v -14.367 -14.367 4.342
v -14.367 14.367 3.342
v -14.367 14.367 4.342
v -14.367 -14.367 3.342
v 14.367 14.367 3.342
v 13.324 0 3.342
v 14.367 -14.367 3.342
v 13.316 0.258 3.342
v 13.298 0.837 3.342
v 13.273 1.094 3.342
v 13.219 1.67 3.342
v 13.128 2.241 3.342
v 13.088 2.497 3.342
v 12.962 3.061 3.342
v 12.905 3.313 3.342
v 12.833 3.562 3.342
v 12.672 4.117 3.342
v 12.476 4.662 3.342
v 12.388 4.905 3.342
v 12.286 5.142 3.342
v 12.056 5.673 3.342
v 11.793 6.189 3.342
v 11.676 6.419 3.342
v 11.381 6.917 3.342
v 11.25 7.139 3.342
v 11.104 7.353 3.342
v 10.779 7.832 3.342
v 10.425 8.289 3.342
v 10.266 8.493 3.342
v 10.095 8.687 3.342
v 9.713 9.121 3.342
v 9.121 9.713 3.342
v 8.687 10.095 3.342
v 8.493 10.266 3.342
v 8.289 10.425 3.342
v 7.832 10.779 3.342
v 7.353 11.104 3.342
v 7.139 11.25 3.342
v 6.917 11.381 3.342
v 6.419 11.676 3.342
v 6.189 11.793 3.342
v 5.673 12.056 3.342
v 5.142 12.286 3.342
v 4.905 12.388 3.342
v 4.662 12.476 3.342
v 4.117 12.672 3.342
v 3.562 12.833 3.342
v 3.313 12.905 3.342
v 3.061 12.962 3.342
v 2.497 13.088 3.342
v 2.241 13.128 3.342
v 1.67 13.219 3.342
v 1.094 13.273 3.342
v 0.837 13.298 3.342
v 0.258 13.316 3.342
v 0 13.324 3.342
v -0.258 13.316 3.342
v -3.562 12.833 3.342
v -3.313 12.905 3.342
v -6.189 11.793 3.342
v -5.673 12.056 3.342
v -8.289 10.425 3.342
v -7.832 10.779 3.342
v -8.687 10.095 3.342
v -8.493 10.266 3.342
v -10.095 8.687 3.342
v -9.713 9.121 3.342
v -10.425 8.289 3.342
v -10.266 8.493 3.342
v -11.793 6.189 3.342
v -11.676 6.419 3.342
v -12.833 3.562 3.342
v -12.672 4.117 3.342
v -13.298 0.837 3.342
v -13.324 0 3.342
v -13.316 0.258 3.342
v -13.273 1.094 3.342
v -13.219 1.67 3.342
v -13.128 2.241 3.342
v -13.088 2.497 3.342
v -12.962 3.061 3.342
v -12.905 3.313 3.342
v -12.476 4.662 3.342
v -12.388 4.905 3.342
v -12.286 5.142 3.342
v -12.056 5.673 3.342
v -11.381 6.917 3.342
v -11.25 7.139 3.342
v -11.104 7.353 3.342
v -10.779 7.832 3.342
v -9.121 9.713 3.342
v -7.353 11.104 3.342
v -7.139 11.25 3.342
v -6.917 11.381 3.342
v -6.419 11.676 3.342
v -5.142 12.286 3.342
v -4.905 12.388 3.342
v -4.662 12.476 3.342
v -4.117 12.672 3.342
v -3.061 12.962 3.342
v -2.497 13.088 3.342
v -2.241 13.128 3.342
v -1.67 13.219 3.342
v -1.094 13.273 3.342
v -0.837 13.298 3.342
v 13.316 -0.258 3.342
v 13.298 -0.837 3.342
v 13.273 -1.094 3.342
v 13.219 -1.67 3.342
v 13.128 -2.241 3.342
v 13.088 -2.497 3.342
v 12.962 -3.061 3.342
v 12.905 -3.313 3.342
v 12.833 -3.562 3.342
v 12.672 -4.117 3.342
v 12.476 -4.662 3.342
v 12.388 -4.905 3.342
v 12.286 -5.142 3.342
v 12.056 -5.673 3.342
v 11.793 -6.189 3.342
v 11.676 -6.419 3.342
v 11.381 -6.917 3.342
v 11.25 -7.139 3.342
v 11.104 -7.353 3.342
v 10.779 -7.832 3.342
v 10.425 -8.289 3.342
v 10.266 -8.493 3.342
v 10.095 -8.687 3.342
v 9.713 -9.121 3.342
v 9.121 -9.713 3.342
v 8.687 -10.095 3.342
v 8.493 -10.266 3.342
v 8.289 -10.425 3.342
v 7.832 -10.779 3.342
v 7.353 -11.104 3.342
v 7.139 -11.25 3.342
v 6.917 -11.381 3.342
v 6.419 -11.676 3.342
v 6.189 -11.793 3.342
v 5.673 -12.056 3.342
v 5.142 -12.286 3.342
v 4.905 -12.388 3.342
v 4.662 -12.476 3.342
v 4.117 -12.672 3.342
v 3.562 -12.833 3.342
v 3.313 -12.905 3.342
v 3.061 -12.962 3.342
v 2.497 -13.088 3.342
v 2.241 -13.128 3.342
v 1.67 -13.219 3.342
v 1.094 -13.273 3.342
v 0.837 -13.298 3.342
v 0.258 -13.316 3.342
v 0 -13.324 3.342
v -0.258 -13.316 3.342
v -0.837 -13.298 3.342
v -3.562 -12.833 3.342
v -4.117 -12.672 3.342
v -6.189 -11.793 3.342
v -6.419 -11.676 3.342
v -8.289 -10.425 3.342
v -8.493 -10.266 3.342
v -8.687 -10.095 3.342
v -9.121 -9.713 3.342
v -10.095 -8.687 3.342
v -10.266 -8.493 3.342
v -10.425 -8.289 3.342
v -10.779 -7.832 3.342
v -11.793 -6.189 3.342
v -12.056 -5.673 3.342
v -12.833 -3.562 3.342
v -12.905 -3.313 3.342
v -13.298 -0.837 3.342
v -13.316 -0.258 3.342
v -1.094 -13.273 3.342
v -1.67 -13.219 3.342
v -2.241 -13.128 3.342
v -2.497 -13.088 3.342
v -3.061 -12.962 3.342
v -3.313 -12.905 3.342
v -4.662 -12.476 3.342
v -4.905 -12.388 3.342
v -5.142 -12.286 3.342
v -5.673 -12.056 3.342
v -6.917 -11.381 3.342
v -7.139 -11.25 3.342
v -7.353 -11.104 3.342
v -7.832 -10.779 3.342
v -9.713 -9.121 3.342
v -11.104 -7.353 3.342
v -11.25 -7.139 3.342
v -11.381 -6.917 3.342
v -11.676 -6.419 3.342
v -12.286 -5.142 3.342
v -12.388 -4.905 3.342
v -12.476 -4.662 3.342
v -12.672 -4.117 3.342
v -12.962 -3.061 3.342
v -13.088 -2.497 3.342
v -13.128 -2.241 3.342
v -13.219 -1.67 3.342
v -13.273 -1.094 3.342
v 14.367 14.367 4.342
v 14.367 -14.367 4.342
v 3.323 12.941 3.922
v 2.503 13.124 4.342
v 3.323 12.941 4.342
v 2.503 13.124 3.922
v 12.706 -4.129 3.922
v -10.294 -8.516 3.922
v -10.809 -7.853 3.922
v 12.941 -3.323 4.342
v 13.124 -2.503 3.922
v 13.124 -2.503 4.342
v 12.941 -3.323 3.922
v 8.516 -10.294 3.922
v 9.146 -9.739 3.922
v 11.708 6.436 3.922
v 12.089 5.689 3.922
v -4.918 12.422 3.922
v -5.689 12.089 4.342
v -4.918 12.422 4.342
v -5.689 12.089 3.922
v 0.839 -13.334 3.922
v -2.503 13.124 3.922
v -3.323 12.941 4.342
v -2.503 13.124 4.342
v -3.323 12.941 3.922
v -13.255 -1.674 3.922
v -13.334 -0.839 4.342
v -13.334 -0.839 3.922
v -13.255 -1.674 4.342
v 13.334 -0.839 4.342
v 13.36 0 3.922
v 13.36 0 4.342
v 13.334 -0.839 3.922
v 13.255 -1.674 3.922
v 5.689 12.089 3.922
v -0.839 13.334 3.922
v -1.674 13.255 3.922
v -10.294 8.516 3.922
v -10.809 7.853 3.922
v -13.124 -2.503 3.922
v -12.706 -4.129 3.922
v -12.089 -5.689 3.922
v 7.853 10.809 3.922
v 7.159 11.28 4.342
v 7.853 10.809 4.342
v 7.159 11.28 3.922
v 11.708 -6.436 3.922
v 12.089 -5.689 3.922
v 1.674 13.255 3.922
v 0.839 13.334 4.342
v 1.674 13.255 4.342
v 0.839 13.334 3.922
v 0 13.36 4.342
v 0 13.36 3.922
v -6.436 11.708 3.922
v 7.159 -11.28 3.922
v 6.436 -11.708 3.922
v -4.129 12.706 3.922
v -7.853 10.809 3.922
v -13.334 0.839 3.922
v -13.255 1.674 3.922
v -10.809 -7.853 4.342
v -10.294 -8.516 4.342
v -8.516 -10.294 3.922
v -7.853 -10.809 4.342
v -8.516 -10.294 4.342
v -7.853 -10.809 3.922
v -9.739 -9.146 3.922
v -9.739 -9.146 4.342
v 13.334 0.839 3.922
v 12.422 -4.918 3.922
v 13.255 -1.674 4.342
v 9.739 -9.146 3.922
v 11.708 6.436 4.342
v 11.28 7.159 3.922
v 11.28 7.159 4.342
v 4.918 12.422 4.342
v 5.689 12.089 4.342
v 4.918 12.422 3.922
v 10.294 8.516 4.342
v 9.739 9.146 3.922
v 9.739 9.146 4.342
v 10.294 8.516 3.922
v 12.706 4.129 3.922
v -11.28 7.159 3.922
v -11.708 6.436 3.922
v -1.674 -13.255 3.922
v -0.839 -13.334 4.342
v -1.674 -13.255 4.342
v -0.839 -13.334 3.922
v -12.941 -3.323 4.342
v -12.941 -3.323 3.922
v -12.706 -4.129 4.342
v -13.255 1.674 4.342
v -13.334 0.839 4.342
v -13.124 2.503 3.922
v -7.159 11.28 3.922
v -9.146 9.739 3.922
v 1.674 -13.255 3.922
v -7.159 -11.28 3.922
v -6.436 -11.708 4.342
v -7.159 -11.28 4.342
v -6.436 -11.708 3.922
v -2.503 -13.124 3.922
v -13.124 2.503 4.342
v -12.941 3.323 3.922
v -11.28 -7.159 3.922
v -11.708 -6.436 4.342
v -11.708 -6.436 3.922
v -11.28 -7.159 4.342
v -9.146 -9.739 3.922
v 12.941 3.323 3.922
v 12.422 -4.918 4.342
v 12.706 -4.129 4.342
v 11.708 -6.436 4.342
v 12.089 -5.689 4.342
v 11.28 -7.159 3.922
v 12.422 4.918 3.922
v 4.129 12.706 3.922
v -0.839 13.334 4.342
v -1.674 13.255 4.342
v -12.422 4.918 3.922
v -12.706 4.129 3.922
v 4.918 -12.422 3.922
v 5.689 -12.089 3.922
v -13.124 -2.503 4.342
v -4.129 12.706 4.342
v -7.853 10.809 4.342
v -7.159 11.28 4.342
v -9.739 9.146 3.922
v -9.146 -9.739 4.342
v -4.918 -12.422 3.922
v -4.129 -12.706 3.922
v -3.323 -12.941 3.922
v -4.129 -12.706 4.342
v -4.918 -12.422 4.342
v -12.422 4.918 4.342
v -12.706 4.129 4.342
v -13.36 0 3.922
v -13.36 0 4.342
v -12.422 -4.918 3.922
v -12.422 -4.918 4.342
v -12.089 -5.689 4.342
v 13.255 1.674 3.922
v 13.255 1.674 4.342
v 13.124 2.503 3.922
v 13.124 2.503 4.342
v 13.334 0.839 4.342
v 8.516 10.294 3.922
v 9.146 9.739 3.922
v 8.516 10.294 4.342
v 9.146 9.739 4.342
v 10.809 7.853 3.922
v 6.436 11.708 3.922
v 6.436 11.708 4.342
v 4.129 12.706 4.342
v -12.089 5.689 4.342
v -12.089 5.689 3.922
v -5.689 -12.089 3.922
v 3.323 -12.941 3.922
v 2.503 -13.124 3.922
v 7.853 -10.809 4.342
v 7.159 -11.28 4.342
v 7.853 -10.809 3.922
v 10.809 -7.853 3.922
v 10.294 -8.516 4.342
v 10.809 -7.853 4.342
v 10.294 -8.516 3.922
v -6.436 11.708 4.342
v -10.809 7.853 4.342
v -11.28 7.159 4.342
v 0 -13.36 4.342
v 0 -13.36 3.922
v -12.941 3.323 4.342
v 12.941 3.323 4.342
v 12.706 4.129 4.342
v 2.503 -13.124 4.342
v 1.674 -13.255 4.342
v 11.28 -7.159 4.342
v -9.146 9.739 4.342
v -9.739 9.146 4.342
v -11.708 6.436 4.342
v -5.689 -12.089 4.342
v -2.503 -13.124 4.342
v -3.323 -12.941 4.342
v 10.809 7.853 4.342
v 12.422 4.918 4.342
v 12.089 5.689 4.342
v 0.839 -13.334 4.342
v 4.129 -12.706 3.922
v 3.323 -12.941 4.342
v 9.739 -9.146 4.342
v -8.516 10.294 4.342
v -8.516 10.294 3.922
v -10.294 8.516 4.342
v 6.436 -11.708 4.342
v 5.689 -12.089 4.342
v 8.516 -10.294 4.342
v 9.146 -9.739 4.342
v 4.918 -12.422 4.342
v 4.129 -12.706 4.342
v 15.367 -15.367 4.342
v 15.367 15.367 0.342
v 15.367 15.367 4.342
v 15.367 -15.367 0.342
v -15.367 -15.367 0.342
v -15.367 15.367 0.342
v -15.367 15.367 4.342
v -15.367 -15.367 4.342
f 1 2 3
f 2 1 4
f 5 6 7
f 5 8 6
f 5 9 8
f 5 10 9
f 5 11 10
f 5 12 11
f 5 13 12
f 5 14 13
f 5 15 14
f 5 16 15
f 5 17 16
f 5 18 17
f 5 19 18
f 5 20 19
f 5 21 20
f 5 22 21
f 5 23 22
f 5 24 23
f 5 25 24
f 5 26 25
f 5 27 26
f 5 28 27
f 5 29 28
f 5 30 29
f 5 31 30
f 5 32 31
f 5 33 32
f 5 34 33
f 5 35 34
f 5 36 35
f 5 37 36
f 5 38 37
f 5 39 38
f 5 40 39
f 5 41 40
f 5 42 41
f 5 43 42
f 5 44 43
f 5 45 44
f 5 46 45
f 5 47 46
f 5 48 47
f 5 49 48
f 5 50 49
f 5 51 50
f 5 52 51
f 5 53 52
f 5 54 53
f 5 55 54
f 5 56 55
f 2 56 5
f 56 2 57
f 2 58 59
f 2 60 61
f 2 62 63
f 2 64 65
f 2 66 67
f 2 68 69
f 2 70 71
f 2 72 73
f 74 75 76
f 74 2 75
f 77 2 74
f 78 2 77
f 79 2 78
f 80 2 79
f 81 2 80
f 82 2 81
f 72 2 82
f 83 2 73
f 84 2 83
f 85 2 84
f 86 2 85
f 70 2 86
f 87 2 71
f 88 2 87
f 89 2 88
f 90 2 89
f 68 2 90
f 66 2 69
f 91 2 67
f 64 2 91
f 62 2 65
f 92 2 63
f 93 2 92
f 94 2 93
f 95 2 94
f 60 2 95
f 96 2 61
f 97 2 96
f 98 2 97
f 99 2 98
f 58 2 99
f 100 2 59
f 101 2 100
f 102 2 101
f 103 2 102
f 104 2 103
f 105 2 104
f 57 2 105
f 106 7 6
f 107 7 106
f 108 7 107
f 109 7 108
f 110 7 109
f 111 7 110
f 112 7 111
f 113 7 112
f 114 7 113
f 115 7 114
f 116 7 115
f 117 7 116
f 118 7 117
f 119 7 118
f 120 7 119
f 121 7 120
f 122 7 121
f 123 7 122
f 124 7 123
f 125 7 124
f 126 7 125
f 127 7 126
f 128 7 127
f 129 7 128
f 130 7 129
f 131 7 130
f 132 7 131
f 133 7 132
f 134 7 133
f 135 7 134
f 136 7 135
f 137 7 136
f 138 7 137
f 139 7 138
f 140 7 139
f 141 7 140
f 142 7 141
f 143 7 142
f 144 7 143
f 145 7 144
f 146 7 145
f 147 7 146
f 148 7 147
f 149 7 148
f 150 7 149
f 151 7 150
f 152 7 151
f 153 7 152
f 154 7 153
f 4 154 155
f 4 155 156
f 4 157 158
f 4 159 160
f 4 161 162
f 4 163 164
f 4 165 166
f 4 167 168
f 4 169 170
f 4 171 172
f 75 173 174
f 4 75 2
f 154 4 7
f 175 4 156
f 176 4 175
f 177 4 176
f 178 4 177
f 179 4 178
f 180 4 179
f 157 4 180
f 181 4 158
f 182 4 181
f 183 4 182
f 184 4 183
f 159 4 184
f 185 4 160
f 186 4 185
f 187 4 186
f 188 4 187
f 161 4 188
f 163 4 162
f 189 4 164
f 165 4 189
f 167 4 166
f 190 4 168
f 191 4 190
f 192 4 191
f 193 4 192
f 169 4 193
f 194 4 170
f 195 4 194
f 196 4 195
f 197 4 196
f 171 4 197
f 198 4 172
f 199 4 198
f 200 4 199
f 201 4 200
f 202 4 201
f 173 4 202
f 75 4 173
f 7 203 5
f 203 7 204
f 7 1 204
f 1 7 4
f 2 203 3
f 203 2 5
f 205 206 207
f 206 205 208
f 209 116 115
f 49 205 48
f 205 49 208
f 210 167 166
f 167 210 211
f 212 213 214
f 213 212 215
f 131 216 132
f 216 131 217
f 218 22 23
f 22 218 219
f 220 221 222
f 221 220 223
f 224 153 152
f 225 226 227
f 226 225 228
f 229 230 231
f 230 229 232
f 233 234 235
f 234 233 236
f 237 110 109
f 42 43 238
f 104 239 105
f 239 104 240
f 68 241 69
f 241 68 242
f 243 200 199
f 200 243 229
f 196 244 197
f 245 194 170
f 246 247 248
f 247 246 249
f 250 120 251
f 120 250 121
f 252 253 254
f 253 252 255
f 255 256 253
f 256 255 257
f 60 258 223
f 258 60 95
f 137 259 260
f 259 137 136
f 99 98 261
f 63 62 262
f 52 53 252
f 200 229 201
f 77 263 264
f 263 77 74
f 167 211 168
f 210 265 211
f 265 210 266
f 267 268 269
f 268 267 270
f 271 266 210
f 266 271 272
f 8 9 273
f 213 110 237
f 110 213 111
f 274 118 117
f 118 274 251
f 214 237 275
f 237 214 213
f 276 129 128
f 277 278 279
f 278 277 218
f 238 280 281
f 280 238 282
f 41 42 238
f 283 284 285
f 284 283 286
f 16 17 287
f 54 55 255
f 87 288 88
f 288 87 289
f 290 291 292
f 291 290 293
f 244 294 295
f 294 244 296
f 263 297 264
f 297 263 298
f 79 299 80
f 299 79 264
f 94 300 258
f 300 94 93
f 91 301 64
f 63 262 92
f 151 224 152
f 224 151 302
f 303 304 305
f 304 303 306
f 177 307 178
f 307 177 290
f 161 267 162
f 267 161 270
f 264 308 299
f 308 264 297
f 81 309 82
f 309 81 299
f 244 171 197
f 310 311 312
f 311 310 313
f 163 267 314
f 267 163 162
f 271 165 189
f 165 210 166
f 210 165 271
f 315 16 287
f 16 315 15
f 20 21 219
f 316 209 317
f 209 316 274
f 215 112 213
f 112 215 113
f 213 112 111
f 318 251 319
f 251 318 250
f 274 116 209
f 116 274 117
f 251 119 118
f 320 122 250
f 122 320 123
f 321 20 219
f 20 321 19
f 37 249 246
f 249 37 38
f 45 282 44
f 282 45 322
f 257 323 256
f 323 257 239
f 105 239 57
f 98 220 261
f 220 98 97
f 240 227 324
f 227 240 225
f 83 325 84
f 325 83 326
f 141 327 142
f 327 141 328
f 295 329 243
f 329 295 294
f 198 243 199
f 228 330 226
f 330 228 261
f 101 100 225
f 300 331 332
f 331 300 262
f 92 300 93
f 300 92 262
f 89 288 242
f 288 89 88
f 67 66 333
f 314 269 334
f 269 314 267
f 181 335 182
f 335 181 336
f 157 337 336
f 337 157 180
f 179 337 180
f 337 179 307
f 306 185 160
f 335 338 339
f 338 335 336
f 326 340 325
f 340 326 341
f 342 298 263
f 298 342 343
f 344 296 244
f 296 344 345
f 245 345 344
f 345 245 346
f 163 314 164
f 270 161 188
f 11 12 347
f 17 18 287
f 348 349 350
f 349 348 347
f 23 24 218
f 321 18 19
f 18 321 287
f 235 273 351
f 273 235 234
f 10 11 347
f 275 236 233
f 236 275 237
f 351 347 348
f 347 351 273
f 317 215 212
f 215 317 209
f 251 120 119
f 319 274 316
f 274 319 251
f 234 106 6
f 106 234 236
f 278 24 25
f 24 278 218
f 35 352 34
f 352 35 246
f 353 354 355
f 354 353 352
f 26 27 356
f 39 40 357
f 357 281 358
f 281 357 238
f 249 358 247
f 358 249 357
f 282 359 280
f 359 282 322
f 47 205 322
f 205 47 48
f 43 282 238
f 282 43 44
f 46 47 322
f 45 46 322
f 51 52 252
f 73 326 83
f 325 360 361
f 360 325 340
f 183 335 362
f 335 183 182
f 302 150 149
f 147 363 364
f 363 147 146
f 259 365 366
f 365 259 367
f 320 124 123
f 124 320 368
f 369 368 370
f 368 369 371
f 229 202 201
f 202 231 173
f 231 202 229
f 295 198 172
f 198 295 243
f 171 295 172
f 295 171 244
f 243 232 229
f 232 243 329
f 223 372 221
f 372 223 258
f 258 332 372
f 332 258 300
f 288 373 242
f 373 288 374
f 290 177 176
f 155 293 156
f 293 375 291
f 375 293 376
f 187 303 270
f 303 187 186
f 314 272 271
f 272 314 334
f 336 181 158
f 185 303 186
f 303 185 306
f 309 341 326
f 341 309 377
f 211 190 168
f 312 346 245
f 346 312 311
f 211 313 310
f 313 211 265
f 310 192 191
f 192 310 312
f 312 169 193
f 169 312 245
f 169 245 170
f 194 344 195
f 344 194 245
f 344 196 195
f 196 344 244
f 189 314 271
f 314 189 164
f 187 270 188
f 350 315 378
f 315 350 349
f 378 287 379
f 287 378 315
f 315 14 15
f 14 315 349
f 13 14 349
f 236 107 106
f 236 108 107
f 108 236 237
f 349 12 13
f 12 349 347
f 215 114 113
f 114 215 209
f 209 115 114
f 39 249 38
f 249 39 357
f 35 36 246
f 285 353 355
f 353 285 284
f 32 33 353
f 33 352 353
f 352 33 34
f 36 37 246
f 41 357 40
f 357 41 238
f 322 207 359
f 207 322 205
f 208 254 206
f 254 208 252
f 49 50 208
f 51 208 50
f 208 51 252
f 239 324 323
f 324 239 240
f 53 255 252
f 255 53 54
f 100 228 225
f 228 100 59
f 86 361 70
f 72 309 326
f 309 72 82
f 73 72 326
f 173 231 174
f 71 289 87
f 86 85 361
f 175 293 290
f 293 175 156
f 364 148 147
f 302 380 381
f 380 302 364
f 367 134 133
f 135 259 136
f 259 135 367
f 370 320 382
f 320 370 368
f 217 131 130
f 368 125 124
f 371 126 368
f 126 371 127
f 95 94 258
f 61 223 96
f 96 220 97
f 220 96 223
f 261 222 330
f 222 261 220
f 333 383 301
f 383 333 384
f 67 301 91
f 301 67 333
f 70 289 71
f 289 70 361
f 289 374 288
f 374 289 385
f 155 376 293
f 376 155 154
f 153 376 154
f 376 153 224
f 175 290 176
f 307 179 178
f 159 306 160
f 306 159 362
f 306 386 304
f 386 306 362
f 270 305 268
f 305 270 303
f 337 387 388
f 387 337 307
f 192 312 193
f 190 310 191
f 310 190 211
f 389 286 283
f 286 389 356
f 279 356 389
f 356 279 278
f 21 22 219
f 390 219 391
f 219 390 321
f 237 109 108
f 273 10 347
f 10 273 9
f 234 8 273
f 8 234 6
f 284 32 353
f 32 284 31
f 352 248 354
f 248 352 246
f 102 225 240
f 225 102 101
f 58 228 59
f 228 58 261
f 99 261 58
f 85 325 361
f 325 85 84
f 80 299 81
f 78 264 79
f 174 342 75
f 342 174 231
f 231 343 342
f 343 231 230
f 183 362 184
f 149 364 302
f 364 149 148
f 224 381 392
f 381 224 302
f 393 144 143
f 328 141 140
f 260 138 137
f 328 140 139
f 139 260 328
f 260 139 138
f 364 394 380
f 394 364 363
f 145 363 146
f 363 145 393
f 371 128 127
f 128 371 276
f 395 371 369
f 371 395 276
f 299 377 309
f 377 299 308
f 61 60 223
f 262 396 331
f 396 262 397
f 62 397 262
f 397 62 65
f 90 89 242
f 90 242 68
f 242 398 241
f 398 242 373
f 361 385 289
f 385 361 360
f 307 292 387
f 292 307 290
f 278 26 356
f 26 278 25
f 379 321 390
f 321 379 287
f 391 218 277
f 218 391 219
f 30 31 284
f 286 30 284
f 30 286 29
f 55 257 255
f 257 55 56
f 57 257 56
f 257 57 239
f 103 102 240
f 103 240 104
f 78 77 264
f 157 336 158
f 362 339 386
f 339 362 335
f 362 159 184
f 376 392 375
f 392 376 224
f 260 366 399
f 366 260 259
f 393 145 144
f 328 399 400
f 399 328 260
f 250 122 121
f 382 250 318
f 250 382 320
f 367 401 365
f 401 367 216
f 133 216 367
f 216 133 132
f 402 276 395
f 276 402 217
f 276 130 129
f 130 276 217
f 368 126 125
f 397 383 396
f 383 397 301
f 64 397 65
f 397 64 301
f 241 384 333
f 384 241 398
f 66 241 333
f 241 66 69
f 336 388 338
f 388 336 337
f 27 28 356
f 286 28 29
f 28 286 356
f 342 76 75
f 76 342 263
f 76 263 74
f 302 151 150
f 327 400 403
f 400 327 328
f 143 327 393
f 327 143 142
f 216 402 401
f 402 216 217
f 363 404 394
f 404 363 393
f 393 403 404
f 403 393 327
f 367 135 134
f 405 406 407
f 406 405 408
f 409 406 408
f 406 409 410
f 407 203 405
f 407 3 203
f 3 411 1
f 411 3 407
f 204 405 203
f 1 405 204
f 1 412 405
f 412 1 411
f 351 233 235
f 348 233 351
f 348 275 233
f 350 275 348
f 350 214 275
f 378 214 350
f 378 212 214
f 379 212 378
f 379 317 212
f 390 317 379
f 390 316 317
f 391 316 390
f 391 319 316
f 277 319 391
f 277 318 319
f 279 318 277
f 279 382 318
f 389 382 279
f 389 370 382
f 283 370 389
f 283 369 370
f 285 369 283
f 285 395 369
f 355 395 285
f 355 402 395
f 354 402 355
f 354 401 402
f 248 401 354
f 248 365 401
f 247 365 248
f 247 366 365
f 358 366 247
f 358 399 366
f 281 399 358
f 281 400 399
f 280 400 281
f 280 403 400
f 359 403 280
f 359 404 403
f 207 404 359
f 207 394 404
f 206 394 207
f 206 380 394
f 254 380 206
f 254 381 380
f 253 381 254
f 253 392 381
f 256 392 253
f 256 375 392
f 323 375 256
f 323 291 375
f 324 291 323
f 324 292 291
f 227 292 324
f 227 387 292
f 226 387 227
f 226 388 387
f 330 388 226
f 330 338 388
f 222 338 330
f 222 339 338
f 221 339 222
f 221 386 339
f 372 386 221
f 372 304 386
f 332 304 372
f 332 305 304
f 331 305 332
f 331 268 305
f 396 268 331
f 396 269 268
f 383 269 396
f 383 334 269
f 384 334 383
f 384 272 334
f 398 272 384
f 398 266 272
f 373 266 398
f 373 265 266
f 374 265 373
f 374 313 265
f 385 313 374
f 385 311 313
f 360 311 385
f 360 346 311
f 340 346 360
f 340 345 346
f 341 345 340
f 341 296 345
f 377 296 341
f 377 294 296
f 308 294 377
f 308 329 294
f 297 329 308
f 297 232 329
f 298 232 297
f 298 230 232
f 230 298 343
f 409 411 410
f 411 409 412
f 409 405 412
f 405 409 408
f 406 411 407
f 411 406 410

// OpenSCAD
// [FL_INDEX: keywords="openscad, 3d_parametric, Lid_for_Half_Sphere_of_Fluid, csg_solid" | COT="Parametric OpenSCAD design from 3DCodeverse"]
// Title: Lid for Half Sphere of Fluid

//This script makes a lid for a half sphere depression in a cube - to be used for reactionware testing
// volume sphere is 4/3*pi*r^3 so volume of half sphere=(3*x/(4*3.14))^(1/3)
// area is 4*pi*r^2
//fluid in mL , 1mL=1000mm^3

//Defines the mL of fluid
x=10; 


a=10*pow(3/4*x/3.14, 0.3333);

module reactor()
{
difference (){
#translate([-a-1,-a-1,-1])cube([2*a+2,2*a+2,a+2]);
sphere(r=a, $fn=100);
}
}

module revreactor(){
rotate([0,180,00])reactor();
}


module lid(){ //simple square lid
difference(){
#translate([-a-2,-a-2,0])cube([2*a+4,2*a+4,4]);
revreactor();
}
}

rotate([180,0,0])translate([0,0,-a/4-1])lid();
